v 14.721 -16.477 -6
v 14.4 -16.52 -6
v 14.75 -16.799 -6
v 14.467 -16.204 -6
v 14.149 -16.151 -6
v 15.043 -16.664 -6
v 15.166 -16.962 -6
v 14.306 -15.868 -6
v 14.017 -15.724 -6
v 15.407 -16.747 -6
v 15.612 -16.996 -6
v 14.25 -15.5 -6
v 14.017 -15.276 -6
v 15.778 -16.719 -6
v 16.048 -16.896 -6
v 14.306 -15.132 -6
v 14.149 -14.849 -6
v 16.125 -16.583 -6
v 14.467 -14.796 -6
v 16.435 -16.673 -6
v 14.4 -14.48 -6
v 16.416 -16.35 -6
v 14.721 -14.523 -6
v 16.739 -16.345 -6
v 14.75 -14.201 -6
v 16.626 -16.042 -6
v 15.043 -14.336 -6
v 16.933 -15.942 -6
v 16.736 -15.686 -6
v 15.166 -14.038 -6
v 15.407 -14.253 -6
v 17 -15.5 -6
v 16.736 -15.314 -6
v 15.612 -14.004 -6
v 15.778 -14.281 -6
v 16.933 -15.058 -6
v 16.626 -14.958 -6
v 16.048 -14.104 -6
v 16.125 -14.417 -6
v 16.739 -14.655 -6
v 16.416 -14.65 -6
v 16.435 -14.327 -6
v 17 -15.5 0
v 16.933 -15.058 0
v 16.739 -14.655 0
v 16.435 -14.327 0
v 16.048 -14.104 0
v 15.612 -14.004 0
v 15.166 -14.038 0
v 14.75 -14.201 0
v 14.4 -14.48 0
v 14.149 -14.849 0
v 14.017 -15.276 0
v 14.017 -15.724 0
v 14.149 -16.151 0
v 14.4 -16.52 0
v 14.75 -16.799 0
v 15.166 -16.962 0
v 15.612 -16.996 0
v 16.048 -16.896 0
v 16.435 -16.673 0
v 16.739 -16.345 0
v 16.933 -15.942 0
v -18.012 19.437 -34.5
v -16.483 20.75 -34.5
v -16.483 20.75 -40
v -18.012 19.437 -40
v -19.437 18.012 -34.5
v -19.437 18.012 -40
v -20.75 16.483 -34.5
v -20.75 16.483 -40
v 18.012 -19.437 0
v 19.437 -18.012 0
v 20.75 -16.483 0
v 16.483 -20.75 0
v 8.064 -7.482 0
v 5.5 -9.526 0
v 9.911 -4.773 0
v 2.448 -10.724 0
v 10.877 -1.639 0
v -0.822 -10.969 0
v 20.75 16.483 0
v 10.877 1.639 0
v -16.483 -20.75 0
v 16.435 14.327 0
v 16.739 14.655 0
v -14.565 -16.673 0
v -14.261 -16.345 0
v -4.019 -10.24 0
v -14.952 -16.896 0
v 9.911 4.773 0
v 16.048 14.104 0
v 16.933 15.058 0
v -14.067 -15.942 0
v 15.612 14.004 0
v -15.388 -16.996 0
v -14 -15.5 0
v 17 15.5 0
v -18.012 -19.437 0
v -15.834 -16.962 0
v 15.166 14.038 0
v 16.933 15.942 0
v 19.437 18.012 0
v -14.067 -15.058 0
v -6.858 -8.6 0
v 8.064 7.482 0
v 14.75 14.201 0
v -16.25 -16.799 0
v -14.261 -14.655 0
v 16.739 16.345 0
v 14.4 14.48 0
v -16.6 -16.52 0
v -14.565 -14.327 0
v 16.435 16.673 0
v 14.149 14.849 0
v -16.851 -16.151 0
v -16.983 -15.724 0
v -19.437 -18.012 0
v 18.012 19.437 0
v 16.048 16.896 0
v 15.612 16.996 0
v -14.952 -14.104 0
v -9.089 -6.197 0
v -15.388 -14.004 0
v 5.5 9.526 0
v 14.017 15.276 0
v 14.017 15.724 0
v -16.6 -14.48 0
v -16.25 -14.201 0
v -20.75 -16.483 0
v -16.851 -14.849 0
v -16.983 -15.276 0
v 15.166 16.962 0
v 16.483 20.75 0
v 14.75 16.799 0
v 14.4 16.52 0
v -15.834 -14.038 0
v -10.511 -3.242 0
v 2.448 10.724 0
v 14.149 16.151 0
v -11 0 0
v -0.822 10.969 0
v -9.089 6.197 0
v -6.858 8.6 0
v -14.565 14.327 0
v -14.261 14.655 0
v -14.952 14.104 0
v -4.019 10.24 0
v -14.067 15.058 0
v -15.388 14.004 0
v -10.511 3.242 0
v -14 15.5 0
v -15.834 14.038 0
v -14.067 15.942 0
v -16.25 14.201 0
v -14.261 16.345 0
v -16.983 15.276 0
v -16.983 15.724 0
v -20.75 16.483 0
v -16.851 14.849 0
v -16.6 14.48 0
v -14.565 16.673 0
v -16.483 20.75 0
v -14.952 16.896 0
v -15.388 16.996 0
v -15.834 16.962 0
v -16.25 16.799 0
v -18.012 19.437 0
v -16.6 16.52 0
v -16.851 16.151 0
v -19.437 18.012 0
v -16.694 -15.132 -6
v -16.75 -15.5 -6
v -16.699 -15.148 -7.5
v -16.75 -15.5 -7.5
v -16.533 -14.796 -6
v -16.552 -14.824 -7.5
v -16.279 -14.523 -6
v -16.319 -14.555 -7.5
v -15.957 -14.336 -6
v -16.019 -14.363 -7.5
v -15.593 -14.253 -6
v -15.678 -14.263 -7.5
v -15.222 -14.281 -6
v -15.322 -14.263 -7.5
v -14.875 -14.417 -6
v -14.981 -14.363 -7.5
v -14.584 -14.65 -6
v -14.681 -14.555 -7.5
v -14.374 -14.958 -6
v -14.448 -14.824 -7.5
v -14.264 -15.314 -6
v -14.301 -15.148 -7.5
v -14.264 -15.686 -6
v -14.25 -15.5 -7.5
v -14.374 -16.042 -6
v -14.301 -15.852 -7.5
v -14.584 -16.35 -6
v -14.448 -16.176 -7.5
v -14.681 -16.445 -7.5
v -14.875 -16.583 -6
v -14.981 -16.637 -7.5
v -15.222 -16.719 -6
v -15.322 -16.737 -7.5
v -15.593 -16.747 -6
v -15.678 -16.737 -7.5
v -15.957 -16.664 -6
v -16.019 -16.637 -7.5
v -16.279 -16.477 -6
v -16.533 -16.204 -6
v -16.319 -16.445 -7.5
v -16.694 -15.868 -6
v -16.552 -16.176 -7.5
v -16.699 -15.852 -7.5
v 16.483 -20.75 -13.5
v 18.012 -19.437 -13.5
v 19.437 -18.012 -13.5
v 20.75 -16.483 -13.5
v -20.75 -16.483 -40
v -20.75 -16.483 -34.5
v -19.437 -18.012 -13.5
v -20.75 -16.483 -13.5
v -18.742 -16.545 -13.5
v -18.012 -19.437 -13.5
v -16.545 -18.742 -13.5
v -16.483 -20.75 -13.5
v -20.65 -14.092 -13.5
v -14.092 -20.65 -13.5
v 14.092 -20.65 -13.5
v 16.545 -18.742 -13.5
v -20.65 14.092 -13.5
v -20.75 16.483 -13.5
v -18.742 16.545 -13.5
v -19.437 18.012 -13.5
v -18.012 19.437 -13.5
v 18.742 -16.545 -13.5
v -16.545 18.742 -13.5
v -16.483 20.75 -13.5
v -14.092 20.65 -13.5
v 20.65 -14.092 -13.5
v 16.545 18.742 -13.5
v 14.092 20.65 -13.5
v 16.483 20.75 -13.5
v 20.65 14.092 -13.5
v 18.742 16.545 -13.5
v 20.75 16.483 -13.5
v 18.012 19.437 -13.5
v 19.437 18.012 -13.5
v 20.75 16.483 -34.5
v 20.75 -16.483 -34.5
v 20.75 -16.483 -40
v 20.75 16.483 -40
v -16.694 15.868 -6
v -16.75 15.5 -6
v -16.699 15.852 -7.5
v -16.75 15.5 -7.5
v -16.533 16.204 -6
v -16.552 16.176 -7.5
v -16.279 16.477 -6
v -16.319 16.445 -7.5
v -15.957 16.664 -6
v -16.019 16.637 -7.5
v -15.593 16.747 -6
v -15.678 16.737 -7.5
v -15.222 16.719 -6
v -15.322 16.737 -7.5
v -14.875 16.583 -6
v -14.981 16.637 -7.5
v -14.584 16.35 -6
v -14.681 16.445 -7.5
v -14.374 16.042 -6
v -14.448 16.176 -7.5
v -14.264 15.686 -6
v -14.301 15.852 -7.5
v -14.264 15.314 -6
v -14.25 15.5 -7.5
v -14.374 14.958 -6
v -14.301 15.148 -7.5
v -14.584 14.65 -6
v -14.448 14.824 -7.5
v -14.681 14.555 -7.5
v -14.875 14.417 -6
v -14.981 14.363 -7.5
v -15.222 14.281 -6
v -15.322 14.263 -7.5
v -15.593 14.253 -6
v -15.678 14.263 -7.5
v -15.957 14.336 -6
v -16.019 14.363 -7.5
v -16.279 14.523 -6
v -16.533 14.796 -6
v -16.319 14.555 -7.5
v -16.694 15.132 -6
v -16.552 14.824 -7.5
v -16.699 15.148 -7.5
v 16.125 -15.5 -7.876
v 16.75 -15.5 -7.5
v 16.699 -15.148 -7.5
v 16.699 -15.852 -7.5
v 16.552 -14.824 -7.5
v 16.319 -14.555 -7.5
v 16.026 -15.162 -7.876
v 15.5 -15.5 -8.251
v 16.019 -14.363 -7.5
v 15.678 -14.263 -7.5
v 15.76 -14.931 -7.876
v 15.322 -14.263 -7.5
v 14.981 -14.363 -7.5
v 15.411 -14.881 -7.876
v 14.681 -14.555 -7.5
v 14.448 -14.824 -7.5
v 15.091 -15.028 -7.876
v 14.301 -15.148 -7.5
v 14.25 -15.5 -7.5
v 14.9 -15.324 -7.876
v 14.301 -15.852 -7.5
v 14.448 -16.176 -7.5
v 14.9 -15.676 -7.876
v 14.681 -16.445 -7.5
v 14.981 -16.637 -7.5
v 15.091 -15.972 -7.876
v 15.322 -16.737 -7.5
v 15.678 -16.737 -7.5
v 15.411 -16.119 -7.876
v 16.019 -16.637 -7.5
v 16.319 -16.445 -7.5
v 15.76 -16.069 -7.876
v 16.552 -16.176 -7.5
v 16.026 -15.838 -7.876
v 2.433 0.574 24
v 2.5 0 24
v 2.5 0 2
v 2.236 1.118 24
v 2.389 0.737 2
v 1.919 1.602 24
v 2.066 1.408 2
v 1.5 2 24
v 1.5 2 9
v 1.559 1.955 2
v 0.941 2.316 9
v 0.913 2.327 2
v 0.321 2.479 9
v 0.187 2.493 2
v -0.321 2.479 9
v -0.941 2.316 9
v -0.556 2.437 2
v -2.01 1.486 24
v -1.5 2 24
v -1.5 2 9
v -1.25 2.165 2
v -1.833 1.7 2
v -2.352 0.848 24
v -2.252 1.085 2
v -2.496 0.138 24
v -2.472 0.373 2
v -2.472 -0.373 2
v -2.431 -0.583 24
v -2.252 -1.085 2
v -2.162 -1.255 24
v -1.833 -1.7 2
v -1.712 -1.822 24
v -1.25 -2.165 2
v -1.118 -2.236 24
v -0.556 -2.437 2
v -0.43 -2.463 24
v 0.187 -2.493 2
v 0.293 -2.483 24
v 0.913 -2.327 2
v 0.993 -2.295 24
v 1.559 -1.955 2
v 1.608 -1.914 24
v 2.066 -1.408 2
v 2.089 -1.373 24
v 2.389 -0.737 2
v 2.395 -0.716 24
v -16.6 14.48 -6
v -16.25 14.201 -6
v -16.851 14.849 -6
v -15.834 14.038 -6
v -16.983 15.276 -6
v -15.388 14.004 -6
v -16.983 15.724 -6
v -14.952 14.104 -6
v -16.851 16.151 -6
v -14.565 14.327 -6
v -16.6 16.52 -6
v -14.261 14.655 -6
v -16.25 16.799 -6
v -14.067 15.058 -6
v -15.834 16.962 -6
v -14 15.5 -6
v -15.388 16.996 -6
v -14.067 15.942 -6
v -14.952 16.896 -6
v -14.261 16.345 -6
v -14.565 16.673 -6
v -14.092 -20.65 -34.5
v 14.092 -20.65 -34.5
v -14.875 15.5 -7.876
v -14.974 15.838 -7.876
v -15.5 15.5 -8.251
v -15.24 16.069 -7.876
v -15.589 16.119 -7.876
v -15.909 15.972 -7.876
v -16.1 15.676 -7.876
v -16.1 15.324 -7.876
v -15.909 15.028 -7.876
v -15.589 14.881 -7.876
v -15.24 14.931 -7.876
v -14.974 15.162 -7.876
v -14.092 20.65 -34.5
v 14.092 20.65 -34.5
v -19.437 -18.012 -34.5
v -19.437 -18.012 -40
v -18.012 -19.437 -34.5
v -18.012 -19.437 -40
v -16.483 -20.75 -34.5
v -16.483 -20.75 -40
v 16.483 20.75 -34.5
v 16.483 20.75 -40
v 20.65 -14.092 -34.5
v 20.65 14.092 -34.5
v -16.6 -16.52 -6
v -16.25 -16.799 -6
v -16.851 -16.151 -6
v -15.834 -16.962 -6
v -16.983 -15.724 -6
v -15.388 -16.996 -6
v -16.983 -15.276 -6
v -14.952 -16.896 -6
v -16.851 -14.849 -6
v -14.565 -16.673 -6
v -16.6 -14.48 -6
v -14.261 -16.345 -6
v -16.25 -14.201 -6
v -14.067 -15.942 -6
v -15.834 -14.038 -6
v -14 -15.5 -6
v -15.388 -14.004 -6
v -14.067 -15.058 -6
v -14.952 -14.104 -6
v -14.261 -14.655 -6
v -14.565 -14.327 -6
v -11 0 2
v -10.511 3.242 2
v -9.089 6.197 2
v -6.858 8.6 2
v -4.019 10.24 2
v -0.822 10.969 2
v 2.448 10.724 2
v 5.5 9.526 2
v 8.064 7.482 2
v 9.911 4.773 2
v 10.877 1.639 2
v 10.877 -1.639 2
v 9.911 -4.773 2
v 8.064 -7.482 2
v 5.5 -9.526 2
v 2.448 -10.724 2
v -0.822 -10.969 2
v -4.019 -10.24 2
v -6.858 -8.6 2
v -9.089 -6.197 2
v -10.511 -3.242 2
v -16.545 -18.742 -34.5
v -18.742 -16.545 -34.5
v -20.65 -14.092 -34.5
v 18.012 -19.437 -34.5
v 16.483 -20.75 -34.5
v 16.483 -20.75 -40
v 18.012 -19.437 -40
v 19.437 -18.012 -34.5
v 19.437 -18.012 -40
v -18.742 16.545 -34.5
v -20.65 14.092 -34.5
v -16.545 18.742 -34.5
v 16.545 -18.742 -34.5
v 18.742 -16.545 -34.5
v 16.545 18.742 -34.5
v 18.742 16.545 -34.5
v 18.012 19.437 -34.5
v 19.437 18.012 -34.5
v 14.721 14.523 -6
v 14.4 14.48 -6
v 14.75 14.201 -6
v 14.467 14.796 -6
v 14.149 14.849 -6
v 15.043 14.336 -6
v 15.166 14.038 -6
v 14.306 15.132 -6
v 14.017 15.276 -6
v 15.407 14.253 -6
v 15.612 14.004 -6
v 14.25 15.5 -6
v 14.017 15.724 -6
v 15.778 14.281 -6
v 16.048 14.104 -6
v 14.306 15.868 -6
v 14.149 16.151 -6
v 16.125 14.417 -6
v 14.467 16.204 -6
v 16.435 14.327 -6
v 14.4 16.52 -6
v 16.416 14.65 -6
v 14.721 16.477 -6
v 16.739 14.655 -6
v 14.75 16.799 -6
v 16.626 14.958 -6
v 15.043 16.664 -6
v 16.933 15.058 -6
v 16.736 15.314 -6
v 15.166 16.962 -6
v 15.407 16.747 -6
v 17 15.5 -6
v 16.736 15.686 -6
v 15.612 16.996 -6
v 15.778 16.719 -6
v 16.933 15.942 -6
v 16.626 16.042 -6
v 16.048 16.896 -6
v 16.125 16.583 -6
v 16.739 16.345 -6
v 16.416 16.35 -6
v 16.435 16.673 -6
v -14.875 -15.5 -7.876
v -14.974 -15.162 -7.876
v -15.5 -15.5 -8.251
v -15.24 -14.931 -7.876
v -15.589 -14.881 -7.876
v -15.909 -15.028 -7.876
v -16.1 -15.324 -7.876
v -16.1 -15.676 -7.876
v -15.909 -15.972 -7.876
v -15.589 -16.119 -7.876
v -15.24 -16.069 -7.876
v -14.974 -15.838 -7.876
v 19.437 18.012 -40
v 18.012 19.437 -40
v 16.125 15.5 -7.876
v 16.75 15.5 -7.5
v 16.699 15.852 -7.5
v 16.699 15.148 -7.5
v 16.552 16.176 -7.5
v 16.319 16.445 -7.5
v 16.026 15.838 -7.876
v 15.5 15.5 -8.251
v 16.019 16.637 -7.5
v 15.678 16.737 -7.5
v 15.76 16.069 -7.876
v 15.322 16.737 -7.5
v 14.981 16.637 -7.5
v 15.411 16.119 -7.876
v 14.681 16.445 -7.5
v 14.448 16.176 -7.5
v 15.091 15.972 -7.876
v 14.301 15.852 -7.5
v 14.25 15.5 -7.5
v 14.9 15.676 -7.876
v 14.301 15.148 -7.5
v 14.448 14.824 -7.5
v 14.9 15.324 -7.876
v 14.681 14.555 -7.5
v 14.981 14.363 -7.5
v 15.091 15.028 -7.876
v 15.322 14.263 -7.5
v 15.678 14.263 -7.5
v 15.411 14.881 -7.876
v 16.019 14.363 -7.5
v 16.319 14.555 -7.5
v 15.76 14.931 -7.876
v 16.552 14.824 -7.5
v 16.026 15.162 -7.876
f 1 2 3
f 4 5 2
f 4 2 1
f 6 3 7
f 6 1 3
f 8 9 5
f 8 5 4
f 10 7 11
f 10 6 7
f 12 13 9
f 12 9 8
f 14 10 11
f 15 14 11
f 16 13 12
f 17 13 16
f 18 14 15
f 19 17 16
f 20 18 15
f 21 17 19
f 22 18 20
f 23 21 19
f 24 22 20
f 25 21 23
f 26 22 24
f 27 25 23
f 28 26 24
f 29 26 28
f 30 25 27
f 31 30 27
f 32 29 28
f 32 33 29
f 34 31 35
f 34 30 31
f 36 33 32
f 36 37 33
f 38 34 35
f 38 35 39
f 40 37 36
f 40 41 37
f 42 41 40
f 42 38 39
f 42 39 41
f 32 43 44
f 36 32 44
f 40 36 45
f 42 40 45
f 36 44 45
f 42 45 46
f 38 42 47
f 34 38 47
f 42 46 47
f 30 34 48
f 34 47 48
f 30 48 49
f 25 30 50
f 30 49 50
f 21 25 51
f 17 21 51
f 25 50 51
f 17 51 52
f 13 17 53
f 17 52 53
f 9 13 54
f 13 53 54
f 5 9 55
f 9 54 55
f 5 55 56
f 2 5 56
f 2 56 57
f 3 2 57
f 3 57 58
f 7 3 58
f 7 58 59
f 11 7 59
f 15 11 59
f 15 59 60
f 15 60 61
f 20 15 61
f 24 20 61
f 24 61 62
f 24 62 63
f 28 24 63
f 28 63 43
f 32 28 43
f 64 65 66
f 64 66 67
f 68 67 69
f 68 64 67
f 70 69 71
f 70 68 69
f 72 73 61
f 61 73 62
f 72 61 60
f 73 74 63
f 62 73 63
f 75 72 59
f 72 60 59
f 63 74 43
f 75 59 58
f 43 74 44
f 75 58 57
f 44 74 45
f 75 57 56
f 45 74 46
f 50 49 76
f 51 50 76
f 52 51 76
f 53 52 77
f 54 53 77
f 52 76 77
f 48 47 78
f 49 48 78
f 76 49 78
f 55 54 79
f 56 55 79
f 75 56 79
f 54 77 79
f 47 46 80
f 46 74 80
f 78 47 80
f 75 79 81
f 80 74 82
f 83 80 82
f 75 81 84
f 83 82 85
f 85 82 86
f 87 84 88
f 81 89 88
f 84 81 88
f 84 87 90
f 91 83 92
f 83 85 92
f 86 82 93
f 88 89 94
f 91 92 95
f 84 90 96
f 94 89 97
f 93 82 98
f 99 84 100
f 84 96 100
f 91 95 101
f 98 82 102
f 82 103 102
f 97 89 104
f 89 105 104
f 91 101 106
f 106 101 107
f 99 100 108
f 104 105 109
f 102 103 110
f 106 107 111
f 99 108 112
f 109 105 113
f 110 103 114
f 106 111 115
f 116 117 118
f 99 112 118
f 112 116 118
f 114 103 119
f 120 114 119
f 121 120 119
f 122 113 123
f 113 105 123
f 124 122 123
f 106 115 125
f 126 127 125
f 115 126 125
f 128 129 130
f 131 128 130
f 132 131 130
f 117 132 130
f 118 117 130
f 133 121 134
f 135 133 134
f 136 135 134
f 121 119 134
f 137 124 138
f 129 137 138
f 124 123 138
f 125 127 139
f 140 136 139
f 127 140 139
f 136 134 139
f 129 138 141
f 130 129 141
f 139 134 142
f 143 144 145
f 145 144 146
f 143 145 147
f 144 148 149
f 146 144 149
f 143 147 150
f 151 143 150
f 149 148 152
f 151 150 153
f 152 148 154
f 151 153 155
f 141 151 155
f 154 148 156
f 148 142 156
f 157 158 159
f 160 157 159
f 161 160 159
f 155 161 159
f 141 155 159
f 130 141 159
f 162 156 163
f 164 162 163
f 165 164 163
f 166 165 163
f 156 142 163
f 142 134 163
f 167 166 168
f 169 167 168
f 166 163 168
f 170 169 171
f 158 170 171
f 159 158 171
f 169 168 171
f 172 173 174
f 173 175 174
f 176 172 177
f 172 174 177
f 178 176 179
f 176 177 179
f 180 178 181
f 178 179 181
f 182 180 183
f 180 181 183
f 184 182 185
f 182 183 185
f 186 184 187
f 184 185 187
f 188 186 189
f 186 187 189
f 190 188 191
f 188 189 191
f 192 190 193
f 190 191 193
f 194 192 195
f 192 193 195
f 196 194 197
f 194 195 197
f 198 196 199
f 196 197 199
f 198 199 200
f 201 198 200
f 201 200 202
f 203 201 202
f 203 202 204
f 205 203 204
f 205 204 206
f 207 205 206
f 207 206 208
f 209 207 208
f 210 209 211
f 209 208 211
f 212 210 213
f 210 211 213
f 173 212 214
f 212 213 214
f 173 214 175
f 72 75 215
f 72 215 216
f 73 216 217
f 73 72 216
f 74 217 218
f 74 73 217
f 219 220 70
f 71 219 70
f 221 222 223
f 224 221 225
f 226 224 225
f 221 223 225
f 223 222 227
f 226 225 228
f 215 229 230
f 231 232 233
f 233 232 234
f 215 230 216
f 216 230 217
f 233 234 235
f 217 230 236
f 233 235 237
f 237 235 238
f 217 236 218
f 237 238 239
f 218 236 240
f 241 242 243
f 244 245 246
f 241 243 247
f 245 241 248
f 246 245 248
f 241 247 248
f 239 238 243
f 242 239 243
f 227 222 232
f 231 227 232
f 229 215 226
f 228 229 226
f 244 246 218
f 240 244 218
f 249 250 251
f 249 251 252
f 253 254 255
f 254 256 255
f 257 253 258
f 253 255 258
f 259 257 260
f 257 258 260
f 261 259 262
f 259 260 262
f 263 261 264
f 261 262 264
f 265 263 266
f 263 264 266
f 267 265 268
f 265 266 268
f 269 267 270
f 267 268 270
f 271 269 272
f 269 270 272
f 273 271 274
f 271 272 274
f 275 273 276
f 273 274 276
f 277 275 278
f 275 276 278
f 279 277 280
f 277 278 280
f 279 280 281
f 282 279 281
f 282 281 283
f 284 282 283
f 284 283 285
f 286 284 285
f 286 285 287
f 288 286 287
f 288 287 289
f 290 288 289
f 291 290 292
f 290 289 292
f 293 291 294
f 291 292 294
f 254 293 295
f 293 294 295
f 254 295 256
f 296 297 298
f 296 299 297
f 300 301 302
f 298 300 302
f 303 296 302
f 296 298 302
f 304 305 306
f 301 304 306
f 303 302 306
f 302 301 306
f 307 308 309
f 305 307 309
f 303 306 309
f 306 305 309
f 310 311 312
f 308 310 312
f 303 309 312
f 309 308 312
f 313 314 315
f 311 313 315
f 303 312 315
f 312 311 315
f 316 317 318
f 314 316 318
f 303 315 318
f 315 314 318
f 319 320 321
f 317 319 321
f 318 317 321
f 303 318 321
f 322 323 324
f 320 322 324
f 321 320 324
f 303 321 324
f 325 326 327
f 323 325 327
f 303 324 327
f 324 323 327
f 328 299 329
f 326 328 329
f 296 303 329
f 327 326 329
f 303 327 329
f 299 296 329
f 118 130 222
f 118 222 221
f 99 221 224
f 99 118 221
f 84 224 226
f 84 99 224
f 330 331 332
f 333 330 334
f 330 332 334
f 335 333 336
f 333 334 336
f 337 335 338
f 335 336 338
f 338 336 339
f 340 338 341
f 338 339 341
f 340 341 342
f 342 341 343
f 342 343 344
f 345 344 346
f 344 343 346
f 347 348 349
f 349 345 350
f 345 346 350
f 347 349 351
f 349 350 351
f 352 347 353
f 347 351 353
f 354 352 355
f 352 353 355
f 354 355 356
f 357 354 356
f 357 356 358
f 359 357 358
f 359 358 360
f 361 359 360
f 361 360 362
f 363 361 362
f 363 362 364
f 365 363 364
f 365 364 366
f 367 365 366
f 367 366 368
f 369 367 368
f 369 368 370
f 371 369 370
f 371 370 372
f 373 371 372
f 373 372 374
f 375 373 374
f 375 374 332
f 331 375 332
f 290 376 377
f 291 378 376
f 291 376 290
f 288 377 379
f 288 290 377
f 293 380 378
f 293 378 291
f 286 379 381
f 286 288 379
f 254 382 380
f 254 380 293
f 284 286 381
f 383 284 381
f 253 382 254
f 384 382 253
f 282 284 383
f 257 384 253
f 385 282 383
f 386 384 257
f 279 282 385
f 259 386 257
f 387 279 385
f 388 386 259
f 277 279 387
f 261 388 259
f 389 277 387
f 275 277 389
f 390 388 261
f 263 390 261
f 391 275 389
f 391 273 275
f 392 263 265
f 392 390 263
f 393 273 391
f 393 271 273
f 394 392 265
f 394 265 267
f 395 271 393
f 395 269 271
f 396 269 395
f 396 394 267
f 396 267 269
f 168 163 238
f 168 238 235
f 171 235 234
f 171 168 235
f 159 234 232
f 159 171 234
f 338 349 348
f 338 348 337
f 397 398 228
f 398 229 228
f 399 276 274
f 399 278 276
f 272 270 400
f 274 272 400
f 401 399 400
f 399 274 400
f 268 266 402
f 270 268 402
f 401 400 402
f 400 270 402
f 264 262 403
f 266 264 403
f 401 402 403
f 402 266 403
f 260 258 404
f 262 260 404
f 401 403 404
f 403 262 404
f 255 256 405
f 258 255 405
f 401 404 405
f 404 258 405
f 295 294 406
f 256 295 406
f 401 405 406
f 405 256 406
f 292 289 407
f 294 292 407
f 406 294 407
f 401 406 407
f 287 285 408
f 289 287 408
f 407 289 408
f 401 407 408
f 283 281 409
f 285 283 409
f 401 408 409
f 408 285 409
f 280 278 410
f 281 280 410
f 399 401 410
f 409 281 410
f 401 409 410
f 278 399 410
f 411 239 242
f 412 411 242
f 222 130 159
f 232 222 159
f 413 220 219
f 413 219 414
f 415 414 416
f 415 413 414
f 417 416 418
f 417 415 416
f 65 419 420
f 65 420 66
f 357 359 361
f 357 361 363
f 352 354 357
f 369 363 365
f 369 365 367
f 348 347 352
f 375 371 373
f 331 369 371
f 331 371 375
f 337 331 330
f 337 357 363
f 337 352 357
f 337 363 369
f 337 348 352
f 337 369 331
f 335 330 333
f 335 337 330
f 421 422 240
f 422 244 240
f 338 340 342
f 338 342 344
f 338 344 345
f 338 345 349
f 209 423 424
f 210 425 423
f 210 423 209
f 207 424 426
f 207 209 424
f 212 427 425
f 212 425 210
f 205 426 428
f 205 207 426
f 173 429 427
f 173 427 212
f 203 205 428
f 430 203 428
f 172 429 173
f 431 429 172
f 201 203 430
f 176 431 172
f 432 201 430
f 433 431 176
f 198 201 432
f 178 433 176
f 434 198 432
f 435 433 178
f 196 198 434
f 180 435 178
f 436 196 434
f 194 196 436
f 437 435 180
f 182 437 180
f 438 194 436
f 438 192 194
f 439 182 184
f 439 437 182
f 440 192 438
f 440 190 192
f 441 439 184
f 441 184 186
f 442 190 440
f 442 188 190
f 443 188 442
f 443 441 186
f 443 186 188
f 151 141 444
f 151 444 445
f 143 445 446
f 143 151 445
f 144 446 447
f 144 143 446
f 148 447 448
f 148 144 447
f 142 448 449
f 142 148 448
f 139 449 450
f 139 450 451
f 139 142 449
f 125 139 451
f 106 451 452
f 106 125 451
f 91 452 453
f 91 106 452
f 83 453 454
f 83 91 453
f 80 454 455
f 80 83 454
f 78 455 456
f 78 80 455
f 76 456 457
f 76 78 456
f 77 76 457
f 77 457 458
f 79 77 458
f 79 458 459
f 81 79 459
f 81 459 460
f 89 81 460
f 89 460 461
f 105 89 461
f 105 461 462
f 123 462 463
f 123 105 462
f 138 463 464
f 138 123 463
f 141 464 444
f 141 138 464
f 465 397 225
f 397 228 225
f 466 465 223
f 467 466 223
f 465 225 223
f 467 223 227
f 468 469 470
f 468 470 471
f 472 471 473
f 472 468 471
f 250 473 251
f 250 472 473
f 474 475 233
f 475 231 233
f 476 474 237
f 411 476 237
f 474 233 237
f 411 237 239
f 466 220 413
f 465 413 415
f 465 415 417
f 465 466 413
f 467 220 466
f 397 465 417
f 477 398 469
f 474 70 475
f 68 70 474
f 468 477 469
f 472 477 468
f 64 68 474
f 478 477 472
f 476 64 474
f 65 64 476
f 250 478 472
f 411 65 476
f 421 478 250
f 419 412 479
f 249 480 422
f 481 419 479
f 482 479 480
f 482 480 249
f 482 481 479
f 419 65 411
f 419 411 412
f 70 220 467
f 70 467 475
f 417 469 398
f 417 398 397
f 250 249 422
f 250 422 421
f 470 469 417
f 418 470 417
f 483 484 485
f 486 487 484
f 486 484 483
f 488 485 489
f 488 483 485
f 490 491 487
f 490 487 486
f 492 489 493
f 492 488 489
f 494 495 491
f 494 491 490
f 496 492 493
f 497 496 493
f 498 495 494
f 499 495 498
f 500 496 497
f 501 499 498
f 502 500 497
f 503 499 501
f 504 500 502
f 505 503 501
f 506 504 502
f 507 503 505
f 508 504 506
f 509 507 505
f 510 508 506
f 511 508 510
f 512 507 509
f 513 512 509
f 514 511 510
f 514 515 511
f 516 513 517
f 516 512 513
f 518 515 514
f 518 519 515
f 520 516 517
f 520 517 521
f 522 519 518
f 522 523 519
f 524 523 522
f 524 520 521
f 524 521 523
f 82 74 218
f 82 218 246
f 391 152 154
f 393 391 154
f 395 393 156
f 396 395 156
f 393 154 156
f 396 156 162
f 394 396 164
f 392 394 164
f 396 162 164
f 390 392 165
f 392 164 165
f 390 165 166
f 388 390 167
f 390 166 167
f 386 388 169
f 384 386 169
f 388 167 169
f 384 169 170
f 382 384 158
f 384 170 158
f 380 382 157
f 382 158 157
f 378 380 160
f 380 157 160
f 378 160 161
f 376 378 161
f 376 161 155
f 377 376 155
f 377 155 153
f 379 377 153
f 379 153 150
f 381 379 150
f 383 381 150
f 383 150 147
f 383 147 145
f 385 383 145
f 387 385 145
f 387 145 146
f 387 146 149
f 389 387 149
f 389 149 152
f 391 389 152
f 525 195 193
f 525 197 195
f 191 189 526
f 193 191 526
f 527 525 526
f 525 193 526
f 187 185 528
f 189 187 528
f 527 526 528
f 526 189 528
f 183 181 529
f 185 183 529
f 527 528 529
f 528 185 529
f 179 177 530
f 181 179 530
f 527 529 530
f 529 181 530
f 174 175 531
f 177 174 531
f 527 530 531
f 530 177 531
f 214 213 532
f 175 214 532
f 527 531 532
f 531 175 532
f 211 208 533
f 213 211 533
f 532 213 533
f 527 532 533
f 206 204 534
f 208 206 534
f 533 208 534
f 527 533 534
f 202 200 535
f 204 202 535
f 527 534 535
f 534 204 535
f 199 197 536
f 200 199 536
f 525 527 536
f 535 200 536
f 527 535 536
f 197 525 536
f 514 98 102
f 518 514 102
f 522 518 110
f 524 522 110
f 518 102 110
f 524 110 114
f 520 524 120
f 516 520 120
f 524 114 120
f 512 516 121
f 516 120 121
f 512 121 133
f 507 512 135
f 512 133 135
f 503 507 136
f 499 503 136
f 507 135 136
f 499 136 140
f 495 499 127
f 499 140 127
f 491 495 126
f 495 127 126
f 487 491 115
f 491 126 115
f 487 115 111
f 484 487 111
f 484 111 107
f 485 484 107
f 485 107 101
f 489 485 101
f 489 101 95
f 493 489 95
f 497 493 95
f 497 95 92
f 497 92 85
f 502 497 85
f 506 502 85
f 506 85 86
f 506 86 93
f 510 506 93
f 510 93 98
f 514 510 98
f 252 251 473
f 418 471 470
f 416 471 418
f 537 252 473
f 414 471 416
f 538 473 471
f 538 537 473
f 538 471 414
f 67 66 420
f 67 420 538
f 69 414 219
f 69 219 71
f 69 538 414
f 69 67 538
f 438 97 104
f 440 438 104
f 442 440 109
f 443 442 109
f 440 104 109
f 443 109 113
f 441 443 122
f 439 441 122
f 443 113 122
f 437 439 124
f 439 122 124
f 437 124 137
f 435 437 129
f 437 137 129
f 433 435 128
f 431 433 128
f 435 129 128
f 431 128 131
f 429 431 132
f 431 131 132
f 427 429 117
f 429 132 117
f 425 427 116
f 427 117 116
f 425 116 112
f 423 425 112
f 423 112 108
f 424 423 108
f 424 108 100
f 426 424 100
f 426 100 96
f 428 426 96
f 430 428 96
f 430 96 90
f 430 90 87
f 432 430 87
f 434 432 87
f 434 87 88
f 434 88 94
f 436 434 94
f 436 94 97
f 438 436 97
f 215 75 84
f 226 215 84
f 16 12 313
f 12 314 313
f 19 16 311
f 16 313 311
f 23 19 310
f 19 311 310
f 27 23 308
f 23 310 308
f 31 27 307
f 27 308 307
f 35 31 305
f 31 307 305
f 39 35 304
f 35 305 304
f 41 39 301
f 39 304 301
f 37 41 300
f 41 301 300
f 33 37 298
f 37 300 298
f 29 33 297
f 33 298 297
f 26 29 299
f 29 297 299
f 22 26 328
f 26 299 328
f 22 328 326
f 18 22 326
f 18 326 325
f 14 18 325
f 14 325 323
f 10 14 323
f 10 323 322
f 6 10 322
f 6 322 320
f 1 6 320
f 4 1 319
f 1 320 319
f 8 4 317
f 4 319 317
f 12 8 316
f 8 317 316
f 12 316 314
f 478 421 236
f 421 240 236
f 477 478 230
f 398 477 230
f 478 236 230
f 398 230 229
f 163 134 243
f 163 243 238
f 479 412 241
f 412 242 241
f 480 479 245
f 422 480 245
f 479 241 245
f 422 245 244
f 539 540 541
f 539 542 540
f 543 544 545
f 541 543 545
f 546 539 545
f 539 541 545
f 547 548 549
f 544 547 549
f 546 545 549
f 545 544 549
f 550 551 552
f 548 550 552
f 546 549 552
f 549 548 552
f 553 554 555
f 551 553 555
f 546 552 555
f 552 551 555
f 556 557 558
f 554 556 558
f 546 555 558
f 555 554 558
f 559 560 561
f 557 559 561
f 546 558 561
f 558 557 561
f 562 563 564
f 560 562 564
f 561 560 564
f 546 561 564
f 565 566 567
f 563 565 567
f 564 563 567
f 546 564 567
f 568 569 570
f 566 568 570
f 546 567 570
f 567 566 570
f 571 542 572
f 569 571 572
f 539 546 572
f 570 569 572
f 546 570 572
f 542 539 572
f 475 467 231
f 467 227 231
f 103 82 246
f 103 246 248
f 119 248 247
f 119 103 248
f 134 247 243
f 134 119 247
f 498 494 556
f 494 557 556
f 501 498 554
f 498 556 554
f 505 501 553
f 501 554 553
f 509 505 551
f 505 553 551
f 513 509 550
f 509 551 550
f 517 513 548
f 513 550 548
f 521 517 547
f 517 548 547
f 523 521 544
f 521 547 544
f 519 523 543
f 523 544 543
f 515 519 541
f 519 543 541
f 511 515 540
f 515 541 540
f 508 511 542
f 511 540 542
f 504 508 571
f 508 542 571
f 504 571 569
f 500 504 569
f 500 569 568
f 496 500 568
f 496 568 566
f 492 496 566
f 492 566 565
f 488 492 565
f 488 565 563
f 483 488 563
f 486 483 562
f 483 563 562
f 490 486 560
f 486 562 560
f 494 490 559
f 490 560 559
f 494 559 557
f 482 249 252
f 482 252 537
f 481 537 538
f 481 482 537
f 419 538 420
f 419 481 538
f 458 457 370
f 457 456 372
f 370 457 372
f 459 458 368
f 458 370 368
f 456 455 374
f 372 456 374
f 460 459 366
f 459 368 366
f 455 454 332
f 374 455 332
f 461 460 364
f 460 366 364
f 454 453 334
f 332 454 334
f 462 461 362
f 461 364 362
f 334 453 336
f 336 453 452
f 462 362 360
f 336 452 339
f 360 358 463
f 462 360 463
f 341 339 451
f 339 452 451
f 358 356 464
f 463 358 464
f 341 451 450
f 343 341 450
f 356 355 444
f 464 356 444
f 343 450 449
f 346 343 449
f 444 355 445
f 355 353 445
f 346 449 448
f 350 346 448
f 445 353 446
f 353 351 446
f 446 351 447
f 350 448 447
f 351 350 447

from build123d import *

# Parameters (mm, degrees)
SKETCH1_R                       = 2.5
BOSS_EXTRUDE1_DEPTH             = 24
SKETCH2_R                       = 11
BOSS_EXTRUDE2_DEPTH             = 2
SKETCH3_W                       = 41.5
SKETCH3_H                       = 41.5
BOSS_EXTRUDE3_DEPTH             = 40
CUT_EXTRUDE1_DEPTH              = 71.40685336
CUT_EXTRUDE1_DEPTH_BACK         = 71.40685336
M3X0_5_TAPPED_HOLE1_D           = 2.5
M3X0_5_TAPPED_HOLE1_DEPTH       = 7.5
M3X0_5_TAPPED_HOLE1_CBORE_D     = 3
M3X0_5_TAPPED_HOLE1_CBORE_DEPTH = 6
M3X0_5_TAPPED_HOLE1_TIP         = 0.751075774
CUT_EXTRUDE2_START              = -15
CUT_EXTRUDE2_DEPTH              = 15
CUT_EXTRUDE3_DEPTH              = 10.5


with BuildPart() as part:
    # Sketch1 → Boss-Extrude1 (new body)
    with BuildSketch(Plane.XY):
        Circle(SKETCH1_R)
    extrude(amount=BOSS_EXTRUDE1_DEPTH)

    # Sketch2 → Boss-Extrude2 (add)
    with BuildSketch(Plane(origin=(0, 0, 0), x_dir=(-1, 0, 0), z_dir=(0, 0, -1))):
        Circle(SKETCH2_R)
    extrude(amount=-BOSS_EXTRUDE2_DEPTH)

    # Sketch3 → Boss-Extrude3 (add)
    with BuildSketch(Plane(origin=(0, 0, 0), x_dir=(-1, 0, 0), z_dir=(0, 0, -1))):
        Rectangle(SKETCH3_W, SKETCH3_H)
    extrude(amount=BOSS_EXTRUDE3_DEPTH)

    # Sketch4 → Cut-Extrude1 (cut, two sides: drawn at the far end of the back side and taken through both)
    with BuildSketch(Plane(origin=(0, 0, -40), x_dir=(-1, 0, 0), z_dir=(0, 0, -1)).offset(-CUT_EXTRUDE1_DEPTH_BACK)):
        with BuildLine():
            Line((-20.75, -16.482945732), (-20.75, -20.75))
            Line((-20.75, -20.75), (-16.482945732, -20.75))
            ThreePointArc((-16.482945732, -20.75), (-18.738329701, -18.738329701), (-20.75, -16.482945732))
        make_face()
        with BuildLine():
            Line((16.482945732, -20.75), (20.75, -20.75))
            Line((20.75, -20.75), (20.75, -16.482945732))
            ThreePointArc((20.75, -16.482945732), (18.738329701, -18.738329701), (16.482945732, -20.75))
        make_face()
        with BuildLine():
            Line((20.75, 16.482945732), (20.75, 20.75))
            Line((20.75, 20.75), (16.482945732, 20.75))
            ThreePointArc((16.482945732, 20.75), (18.738329701, 18.738329701), (20.75, 16.482945732))
        make_face()
        with BuildLine():
            Line((-16.482945732, 20.75), (-20.75, 20.75))
            Line((-20.75, 20.75), (-20.75, 16.482945732))
            ThreePointArc((-20.75, 16.482945732), (-18.738329701, 18.738329701), (-16.482945732, 20.75))
        make_face()
    extrude(amount=CUT_EXTRUDE1_DEPTH + CUT_EXTRUDE1_DEPTH_BACK, mode=Mode.SUBTRACT)

    # M3x0.5 Tapped Hole1
    with Locations(Plane.XY):
        with Locations((-15.5, 15.5), (-15.5, -15.5), (15.5, -15.5), (15.5, 15.5)):
            CounterBoreHole(M3X0_5_TAPPED_HOLE1_D / 2, M3X0_5_TAPPED_HOLE1_CBORE_D / 2, M3X0_5_TAPPED_HOLE1_CBORE_DEPTH, depth=M3X0_5_TAPPED_HOLE1_DEPTH)
            with Locations((0, 0, -(M3X0_5_TAPPED_HOLE1_DEPTH + M3X0_5_TAPPED_HOLE1_TIP / 2))):  # 118° drill point
                Cone(0, M3X0_5_TAPPED_HOLE1_D / 2, M3X0_5_TAPPED_HOLE1_TIP, mode=Mode.SUBTRACT)

    # Sketch7 → Cut-Extrude2 (cut)
    with BuildSketch(Plane.XY.offset(24).offset(CUT_EXTRUDE2_START)):
        with BuildLine():
            Line((-1.5, 2), (1.5, 2))
            ThreePointArc((1.5, 2), (0, 2.5), (-1.5, 2))
        make_face()
    extrude(amount=CUT_EXTRUDE2_DEPTH, mode=Mode.SUBTRACT)

    # Sketch8 → Cut-Extrude3 (cut, symmetric)
    with BuildSketch(Plane.XY.offset(-24)):
        with BuildLine():
            Line((16.482945732, 20.75), (-16.482945732, 20.75))
            ThreePointArc((-16.482945732, 20.75), (-18.738329701, 18.738329701), (-20.75, 16.482945732))
            Line((-20.75, 16.482945732), (-20.75, -16.482945732))
            ThreePointArc((-20.75, -16.482945732), (-18.738329701, -18.738329701), (-16.482945732, -20.75))
            Line((-16.482945732, -20.75), (16.482945732, -20.75))
            ThreePointArc((16.482945732, -20.75), (18.738329701, -18.738329701), (20.75, -16.482945732))
            Line((20.75, -16.482945732), (20.75, 16.482945732))
            ThreePointArc((20.75, 16.482945732), (18.738329701, 18.738329701), (16.482945732, 20.75))
        make_face()
        with BuildLine():
            Line((-14.091752907, 20.65), (14.091752907, 20.65))
            ThreePointArc((14.091752907, 20.65), (17.67766953, 17.67766953), (20.65, 14.091752907))
            Line((20.65, 14.091752907), (20.65, -14.091752907))
            ThreePointArc((20.65, -14.091752907), (17.67766953, -17.67766953), (14.091752907, -20.65))
            Line((14.091752907, -20.65), (-14.091752907, -20.65))
            ThreePointArc((-14.091752907, -20.65), (-17.67766953, -17.67766953), (-20.65, -14.091752907))
            Line((-20.65, -14.091752907), (-20.65, 14.091752907))
            ThreePointArc((-20.65, 14.091752907), (-17.67766953, 17.67766953), (-14.091752907, 20.65))
        make_face(mode=Mode.SUBTRACT)
    extrude(amount=CUT_EXTRUDE3_DEPTH, both=True, mode=Mode.SUBTRACT)


solid = part.part
